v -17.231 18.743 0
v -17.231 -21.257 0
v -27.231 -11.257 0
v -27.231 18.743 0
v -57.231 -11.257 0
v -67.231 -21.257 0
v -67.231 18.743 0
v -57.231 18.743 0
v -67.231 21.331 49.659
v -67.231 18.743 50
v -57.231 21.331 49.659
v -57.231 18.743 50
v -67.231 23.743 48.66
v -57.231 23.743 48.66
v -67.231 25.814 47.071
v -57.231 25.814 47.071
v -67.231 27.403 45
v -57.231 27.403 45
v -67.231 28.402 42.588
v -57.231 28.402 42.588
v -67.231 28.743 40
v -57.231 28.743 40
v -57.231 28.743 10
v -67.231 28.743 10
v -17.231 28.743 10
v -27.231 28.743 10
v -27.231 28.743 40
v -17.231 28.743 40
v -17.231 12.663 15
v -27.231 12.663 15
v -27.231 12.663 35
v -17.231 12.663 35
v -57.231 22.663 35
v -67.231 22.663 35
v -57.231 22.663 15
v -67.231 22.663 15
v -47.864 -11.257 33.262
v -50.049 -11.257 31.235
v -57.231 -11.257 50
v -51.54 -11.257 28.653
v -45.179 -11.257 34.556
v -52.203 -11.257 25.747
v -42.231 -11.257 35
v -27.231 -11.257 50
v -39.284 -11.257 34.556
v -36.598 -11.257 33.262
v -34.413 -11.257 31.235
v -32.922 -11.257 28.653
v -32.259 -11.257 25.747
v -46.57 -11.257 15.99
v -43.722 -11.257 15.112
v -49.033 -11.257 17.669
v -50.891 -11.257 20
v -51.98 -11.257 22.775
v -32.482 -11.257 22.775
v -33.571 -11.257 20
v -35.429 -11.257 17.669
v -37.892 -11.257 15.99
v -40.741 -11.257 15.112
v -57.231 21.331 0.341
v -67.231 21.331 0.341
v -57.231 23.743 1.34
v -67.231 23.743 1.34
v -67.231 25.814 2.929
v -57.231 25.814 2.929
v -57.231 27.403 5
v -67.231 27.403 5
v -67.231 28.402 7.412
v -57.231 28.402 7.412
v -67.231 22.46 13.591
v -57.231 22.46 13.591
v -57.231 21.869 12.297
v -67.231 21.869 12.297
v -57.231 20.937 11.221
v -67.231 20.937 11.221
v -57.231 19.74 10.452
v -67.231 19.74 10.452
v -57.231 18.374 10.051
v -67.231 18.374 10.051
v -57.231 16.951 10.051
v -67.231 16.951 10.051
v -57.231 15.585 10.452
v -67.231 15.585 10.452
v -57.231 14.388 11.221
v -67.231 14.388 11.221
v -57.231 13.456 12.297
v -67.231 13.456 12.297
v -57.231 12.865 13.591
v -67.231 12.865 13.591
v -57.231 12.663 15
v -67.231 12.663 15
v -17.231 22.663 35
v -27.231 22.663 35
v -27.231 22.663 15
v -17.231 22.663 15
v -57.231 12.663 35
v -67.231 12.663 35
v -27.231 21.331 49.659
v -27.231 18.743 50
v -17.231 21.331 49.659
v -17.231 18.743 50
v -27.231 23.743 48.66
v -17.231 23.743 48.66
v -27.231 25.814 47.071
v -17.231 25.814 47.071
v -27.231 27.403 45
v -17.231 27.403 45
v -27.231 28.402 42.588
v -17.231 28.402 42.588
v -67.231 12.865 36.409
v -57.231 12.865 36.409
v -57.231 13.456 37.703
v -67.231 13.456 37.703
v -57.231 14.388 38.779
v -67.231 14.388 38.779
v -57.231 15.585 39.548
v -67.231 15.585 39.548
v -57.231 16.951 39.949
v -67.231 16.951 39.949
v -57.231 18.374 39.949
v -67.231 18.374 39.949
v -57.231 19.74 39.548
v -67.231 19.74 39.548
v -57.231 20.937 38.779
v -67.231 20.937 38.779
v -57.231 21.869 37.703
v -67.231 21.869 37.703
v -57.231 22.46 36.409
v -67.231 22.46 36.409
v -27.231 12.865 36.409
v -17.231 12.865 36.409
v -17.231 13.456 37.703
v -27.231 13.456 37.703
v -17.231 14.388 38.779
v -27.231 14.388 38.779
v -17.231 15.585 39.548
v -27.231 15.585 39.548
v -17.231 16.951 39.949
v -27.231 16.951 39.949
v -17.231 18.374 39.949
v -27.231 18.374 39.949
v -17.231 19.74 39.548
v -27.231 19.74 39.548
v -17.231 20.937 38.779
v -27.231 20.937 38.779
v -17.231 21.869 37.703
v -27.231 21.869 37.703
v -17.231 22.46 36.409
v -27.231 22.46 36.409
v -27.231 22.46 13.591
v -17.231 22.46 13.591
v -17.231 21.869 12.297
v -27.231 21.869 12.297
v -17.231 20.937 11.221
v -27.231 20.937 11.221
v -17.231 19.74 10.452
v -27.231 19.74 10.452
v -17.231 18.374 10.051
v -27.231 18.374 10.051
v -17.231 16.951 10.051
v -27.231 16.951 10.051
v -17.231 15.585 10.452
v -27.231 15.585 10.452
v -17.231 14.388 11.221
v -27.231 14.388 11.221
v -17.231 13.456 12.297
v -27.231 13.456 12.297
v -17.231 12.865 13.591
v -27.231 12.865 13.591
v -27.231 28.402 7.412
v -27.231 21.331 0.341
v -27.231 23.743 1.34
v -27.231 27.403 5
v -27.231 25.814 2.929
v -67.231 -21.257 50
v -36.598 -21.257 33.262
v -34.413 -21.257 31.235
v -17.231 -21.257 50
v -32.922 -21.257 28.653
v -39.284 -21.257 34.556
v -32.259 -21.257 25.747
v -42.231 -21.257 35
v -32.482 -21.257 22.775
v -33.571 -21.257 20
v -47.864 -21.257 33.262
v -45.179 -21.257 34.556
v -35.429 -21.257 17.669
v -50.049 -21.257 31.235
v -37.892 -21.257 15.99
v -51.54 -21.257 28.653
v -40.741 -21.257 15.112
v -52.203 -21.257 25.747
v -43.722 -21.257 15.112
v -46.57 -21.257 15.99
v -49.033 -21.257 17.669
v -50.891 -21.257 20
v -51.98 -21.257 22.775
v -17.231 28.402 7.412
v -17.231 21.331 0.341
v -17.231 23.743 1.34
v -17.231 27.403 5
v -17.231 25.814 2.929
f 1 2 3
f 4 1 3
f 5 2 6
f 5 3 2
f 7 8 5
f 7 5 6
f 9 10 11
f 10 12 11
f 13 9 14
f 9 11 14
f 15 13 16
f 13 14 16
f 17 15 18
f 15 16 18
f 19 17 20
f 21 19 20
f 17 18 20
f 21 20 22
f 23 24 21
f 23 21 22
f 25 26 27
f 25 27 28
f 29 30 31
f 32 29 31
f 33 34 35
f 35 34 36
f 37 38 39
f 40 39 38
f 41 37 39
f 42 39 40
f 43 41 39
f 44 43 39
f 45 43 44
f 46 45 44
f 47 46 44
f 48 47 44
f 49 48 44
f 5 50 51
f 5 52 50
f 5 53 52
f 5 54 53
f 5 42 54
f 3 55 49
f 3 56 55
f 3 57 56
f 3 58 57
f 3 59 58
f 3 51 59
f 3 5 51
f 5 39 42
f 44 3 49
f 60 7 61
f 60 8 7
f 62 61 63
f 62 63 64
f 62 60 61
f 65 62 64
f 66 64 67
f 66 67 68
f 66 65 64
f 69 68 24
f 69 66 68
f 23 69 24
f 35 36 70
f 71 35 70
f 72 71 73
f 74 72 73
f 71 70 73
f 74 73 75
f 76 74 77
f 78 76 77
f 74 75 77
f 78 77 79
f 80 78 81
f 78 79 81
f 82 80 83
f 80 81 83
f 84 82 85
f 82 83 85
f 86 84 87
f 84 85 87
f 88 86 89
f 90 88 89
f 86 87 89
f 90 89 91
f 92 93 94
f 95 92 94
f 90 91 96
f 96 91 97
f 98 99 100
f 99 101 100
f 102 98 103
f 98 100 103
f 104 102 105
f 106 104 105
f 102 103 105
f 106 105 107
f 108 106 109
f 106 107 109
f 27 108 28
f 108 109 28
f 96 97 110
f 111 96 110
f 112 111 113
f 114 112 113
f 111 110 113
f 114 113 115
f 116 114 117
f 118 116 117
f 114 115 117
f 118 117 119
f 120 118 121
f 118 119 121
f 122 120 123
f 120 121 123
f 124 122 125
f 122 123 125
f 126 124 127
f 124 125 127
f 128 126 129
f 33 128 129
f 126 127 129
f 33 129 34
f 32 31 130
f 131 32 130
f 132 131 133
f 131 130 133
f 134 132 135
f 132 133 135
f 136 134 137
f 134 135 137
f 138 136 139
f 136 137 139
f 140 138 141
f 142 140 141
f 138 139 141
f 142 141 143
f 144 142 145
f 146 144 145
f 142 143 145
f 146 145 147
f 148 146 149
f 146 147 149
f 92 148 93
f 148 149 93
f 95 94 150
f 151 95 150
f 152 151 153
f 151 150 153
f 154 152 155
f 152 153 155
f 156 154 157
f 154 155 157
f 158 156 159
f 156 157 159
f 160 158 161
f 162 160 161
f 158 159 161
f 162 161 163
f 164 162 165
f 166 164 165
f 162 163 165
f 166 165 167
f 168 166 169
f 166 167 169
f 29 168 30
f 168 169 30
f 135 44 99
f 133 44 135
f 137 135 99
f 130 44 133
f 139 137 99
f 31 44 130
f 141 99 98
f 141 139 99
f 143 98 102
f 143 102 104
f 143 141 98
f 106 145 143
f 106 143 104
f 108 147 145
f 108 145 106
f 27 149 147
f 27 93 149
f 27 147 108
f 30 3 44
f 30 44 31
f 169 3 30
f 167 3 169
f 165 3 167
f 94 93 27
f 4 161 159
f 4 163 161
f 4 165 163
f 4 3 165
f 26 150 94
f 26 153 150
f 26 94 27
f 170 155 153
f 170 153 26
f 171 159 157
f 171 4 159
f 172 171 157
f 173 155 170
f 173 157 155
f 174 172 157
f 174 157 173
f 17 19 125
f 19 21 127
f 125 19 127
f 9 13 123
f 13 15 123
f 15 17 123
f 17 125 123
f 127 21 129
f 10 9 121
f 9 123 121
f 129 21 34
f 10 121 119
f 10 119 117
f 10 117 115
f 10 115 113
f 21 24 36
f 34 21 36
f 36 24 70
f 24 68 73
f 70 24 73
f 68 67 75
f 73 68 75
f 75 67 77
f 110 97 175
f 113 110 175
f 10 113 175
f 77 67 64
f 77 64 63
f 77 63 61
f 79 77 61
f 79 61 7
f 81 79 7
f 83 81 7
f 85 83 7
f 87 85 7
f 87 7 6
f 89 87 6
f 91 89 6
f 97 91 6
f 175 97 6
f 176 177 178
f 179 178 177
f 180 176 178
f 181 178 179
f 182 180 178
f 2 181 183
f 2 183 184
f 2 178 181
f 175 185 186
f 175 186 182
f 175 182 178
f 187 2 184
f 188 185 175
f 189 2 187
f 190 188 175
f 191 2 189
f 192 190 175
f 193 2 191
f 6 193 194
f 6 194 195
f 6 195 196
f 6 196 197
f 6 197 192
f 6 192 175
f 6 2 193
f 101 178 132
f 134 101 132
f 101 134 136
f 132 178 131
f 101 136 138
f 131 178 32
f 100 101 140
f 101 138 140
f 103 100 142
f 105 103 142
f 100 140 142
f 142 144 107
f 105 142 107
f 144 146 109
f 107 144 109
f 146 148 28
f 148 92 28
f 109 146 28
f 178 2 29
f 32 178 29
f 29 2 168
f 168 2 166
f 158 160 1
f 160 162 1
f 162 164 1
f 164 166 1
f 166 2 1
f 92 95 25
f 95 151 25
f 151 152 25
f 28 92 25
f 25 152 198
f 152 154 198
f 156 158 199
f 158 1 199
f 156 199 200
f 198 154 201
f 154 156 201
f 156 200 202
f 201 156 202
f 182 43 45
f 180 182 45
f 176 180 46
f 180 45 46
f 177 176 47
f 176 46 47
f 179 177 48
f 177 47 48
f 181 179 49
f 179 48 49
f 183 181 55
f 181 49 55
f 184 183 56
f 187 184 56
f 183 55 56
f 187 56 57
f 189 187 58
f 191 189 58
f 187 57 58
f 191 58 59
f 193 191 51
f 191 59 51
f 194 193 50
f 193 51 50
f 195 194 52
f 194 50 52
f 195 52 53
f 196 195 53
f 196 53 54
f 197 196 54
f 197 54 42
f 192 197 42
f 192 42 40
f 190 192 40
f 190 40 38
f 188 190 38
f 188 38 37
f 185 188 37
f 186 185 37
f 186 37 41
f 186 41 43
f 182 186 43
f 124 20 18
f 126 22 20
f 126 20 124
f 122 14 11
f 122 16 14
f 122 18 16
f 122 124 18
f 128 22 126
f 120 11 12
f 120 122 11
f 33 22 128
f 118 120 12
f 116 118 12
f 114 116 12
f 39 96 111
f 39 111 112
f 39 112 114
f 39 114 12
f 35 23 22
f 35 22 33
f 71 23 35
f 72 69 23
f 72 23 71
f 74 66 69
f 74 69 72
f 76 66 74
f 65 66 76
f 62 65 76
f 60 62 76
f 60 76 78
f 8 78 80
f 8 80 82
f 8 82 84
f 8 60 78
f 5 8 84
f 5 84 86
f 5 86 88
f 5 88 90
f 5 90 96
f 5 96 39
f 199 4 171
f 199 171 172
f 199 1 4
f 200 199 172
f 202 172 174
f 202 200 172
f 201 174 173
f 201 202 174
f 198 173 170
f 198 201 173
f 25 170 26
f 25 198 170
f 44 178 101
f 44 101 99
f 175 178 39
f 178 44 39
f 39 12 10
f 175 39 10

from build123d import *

# Parameters (mm, degrees)
Y_KSEKLIK_EKSTR_ZYON1_DEPTH = 50
KES_EKSTR_ZYON1_REACH       = 94.844
IZIM2_R                     = 10
KES_EKSTR_ZYON2_DEPTH       = 77.329104323
KES_EKSTR_ZYON2_DEPTH_BACK  = 77.329104323
RADYUS1_R                   = 10
RADYUS2_R                   = 10


with BuildPart() as part:
    # Çizim1 → Yükseklik-Ekstrüzyon1 (new body)
    with BuildSketch(Plane.XY):
        Polygon((-57.23116586, -11.25748503), (-27.23116586, -11.25748503), (-27.23116586, 28.74251497), (-17.23116586, 28.74251497), (-17.23116586, 21.706586826), (-17.23116586, -21.25748503), (-67.23116586, -21.25748503), (-67.23116586, 21.706586826), (-67.23116586, 28.74251497), (-57.23116586, 28.74251497), align=None)
    extrude(amount=Y_KSEKLIK_EKSTR_ZYON1_DEPTH)

    # Çizim2 → Kes-Ekstrüzyon1 (cut, up to next)
    with BuildSketch(Plane(origin=(0, -11.25748503, 0), x_dir=(1, 0, 0), z_dir=(0, 1, 0)), mode=Mode.PRIVATE) as kes_ekstr_zyon1_sk1:
        with Locations(Location((-42.23116586, -25, 0), (0, 0, 270))):
            Circle(IZIM2_R)
    kes_ekstr_zyon1_tool1 = extrude(kes_ekstr_zyon1_sk1.sketch, amount=-KES_EKSTR_ZYON1_REACH, mode=Mode.PRIVATE) & part.part
    add(kes_ekstr_zyon1_tool1.solids().sort_by_distance((-42.231166, -11.257485, 25))[0], mode=Mode.SUBTRACT)

    # Çizim3 → Kes-Ekstrüzyon2 (cut, two sides: drawn at the far end of the back side and taken through both)
    with BuildSketch(Plane(origin=(-17.23116586, 0, 0), x_dir=(0, 0, -1), z_dir=(1, 0, 0)).offset(-KES_EKSTR_ZYON2_DEPTH_BACK)):
        with BuildLine():
            Line((-35, 22.662565506), (-15, 22.662565506))
            ThreePointArc((-15, 22.662565506), (-10, 17.662565506), (-15, 12.662565506))
            Line((-15, 12.662565506), (-35, 12.662565506))
            ThreePointArc((-35, 12.662565506), (-40, 17.662565506), (-35, 22.662565506))
        make_face()
    extrude(amount=KES_EKSTR_ZYON2_DEPTH + KES_EKSTR_ZYON2_DEPTH_BACK, mode=Mode.SUBTRACT)

    # Radyus1
    radyus1_edges = [part.edges().sort_by_distance(p)[0] for p in [
        (-62.23116586, 28.74251497, 0),
        (-62.23116586, 28.74251497, 50),
    ]]
    fillet(radyus1_edges, radius=RADYUS1_R)

    # Radyus2
    radyus2_edges = [part.edges().sort_by_distance(p)[0] for p in [
        (-22.23116586, 28.74251497, 0),
        (-22.23116586, 28.74251497, 50),
    ]]
    fillet(radyus2_edges, radius=RADYUS2_R)


solid = part.part
